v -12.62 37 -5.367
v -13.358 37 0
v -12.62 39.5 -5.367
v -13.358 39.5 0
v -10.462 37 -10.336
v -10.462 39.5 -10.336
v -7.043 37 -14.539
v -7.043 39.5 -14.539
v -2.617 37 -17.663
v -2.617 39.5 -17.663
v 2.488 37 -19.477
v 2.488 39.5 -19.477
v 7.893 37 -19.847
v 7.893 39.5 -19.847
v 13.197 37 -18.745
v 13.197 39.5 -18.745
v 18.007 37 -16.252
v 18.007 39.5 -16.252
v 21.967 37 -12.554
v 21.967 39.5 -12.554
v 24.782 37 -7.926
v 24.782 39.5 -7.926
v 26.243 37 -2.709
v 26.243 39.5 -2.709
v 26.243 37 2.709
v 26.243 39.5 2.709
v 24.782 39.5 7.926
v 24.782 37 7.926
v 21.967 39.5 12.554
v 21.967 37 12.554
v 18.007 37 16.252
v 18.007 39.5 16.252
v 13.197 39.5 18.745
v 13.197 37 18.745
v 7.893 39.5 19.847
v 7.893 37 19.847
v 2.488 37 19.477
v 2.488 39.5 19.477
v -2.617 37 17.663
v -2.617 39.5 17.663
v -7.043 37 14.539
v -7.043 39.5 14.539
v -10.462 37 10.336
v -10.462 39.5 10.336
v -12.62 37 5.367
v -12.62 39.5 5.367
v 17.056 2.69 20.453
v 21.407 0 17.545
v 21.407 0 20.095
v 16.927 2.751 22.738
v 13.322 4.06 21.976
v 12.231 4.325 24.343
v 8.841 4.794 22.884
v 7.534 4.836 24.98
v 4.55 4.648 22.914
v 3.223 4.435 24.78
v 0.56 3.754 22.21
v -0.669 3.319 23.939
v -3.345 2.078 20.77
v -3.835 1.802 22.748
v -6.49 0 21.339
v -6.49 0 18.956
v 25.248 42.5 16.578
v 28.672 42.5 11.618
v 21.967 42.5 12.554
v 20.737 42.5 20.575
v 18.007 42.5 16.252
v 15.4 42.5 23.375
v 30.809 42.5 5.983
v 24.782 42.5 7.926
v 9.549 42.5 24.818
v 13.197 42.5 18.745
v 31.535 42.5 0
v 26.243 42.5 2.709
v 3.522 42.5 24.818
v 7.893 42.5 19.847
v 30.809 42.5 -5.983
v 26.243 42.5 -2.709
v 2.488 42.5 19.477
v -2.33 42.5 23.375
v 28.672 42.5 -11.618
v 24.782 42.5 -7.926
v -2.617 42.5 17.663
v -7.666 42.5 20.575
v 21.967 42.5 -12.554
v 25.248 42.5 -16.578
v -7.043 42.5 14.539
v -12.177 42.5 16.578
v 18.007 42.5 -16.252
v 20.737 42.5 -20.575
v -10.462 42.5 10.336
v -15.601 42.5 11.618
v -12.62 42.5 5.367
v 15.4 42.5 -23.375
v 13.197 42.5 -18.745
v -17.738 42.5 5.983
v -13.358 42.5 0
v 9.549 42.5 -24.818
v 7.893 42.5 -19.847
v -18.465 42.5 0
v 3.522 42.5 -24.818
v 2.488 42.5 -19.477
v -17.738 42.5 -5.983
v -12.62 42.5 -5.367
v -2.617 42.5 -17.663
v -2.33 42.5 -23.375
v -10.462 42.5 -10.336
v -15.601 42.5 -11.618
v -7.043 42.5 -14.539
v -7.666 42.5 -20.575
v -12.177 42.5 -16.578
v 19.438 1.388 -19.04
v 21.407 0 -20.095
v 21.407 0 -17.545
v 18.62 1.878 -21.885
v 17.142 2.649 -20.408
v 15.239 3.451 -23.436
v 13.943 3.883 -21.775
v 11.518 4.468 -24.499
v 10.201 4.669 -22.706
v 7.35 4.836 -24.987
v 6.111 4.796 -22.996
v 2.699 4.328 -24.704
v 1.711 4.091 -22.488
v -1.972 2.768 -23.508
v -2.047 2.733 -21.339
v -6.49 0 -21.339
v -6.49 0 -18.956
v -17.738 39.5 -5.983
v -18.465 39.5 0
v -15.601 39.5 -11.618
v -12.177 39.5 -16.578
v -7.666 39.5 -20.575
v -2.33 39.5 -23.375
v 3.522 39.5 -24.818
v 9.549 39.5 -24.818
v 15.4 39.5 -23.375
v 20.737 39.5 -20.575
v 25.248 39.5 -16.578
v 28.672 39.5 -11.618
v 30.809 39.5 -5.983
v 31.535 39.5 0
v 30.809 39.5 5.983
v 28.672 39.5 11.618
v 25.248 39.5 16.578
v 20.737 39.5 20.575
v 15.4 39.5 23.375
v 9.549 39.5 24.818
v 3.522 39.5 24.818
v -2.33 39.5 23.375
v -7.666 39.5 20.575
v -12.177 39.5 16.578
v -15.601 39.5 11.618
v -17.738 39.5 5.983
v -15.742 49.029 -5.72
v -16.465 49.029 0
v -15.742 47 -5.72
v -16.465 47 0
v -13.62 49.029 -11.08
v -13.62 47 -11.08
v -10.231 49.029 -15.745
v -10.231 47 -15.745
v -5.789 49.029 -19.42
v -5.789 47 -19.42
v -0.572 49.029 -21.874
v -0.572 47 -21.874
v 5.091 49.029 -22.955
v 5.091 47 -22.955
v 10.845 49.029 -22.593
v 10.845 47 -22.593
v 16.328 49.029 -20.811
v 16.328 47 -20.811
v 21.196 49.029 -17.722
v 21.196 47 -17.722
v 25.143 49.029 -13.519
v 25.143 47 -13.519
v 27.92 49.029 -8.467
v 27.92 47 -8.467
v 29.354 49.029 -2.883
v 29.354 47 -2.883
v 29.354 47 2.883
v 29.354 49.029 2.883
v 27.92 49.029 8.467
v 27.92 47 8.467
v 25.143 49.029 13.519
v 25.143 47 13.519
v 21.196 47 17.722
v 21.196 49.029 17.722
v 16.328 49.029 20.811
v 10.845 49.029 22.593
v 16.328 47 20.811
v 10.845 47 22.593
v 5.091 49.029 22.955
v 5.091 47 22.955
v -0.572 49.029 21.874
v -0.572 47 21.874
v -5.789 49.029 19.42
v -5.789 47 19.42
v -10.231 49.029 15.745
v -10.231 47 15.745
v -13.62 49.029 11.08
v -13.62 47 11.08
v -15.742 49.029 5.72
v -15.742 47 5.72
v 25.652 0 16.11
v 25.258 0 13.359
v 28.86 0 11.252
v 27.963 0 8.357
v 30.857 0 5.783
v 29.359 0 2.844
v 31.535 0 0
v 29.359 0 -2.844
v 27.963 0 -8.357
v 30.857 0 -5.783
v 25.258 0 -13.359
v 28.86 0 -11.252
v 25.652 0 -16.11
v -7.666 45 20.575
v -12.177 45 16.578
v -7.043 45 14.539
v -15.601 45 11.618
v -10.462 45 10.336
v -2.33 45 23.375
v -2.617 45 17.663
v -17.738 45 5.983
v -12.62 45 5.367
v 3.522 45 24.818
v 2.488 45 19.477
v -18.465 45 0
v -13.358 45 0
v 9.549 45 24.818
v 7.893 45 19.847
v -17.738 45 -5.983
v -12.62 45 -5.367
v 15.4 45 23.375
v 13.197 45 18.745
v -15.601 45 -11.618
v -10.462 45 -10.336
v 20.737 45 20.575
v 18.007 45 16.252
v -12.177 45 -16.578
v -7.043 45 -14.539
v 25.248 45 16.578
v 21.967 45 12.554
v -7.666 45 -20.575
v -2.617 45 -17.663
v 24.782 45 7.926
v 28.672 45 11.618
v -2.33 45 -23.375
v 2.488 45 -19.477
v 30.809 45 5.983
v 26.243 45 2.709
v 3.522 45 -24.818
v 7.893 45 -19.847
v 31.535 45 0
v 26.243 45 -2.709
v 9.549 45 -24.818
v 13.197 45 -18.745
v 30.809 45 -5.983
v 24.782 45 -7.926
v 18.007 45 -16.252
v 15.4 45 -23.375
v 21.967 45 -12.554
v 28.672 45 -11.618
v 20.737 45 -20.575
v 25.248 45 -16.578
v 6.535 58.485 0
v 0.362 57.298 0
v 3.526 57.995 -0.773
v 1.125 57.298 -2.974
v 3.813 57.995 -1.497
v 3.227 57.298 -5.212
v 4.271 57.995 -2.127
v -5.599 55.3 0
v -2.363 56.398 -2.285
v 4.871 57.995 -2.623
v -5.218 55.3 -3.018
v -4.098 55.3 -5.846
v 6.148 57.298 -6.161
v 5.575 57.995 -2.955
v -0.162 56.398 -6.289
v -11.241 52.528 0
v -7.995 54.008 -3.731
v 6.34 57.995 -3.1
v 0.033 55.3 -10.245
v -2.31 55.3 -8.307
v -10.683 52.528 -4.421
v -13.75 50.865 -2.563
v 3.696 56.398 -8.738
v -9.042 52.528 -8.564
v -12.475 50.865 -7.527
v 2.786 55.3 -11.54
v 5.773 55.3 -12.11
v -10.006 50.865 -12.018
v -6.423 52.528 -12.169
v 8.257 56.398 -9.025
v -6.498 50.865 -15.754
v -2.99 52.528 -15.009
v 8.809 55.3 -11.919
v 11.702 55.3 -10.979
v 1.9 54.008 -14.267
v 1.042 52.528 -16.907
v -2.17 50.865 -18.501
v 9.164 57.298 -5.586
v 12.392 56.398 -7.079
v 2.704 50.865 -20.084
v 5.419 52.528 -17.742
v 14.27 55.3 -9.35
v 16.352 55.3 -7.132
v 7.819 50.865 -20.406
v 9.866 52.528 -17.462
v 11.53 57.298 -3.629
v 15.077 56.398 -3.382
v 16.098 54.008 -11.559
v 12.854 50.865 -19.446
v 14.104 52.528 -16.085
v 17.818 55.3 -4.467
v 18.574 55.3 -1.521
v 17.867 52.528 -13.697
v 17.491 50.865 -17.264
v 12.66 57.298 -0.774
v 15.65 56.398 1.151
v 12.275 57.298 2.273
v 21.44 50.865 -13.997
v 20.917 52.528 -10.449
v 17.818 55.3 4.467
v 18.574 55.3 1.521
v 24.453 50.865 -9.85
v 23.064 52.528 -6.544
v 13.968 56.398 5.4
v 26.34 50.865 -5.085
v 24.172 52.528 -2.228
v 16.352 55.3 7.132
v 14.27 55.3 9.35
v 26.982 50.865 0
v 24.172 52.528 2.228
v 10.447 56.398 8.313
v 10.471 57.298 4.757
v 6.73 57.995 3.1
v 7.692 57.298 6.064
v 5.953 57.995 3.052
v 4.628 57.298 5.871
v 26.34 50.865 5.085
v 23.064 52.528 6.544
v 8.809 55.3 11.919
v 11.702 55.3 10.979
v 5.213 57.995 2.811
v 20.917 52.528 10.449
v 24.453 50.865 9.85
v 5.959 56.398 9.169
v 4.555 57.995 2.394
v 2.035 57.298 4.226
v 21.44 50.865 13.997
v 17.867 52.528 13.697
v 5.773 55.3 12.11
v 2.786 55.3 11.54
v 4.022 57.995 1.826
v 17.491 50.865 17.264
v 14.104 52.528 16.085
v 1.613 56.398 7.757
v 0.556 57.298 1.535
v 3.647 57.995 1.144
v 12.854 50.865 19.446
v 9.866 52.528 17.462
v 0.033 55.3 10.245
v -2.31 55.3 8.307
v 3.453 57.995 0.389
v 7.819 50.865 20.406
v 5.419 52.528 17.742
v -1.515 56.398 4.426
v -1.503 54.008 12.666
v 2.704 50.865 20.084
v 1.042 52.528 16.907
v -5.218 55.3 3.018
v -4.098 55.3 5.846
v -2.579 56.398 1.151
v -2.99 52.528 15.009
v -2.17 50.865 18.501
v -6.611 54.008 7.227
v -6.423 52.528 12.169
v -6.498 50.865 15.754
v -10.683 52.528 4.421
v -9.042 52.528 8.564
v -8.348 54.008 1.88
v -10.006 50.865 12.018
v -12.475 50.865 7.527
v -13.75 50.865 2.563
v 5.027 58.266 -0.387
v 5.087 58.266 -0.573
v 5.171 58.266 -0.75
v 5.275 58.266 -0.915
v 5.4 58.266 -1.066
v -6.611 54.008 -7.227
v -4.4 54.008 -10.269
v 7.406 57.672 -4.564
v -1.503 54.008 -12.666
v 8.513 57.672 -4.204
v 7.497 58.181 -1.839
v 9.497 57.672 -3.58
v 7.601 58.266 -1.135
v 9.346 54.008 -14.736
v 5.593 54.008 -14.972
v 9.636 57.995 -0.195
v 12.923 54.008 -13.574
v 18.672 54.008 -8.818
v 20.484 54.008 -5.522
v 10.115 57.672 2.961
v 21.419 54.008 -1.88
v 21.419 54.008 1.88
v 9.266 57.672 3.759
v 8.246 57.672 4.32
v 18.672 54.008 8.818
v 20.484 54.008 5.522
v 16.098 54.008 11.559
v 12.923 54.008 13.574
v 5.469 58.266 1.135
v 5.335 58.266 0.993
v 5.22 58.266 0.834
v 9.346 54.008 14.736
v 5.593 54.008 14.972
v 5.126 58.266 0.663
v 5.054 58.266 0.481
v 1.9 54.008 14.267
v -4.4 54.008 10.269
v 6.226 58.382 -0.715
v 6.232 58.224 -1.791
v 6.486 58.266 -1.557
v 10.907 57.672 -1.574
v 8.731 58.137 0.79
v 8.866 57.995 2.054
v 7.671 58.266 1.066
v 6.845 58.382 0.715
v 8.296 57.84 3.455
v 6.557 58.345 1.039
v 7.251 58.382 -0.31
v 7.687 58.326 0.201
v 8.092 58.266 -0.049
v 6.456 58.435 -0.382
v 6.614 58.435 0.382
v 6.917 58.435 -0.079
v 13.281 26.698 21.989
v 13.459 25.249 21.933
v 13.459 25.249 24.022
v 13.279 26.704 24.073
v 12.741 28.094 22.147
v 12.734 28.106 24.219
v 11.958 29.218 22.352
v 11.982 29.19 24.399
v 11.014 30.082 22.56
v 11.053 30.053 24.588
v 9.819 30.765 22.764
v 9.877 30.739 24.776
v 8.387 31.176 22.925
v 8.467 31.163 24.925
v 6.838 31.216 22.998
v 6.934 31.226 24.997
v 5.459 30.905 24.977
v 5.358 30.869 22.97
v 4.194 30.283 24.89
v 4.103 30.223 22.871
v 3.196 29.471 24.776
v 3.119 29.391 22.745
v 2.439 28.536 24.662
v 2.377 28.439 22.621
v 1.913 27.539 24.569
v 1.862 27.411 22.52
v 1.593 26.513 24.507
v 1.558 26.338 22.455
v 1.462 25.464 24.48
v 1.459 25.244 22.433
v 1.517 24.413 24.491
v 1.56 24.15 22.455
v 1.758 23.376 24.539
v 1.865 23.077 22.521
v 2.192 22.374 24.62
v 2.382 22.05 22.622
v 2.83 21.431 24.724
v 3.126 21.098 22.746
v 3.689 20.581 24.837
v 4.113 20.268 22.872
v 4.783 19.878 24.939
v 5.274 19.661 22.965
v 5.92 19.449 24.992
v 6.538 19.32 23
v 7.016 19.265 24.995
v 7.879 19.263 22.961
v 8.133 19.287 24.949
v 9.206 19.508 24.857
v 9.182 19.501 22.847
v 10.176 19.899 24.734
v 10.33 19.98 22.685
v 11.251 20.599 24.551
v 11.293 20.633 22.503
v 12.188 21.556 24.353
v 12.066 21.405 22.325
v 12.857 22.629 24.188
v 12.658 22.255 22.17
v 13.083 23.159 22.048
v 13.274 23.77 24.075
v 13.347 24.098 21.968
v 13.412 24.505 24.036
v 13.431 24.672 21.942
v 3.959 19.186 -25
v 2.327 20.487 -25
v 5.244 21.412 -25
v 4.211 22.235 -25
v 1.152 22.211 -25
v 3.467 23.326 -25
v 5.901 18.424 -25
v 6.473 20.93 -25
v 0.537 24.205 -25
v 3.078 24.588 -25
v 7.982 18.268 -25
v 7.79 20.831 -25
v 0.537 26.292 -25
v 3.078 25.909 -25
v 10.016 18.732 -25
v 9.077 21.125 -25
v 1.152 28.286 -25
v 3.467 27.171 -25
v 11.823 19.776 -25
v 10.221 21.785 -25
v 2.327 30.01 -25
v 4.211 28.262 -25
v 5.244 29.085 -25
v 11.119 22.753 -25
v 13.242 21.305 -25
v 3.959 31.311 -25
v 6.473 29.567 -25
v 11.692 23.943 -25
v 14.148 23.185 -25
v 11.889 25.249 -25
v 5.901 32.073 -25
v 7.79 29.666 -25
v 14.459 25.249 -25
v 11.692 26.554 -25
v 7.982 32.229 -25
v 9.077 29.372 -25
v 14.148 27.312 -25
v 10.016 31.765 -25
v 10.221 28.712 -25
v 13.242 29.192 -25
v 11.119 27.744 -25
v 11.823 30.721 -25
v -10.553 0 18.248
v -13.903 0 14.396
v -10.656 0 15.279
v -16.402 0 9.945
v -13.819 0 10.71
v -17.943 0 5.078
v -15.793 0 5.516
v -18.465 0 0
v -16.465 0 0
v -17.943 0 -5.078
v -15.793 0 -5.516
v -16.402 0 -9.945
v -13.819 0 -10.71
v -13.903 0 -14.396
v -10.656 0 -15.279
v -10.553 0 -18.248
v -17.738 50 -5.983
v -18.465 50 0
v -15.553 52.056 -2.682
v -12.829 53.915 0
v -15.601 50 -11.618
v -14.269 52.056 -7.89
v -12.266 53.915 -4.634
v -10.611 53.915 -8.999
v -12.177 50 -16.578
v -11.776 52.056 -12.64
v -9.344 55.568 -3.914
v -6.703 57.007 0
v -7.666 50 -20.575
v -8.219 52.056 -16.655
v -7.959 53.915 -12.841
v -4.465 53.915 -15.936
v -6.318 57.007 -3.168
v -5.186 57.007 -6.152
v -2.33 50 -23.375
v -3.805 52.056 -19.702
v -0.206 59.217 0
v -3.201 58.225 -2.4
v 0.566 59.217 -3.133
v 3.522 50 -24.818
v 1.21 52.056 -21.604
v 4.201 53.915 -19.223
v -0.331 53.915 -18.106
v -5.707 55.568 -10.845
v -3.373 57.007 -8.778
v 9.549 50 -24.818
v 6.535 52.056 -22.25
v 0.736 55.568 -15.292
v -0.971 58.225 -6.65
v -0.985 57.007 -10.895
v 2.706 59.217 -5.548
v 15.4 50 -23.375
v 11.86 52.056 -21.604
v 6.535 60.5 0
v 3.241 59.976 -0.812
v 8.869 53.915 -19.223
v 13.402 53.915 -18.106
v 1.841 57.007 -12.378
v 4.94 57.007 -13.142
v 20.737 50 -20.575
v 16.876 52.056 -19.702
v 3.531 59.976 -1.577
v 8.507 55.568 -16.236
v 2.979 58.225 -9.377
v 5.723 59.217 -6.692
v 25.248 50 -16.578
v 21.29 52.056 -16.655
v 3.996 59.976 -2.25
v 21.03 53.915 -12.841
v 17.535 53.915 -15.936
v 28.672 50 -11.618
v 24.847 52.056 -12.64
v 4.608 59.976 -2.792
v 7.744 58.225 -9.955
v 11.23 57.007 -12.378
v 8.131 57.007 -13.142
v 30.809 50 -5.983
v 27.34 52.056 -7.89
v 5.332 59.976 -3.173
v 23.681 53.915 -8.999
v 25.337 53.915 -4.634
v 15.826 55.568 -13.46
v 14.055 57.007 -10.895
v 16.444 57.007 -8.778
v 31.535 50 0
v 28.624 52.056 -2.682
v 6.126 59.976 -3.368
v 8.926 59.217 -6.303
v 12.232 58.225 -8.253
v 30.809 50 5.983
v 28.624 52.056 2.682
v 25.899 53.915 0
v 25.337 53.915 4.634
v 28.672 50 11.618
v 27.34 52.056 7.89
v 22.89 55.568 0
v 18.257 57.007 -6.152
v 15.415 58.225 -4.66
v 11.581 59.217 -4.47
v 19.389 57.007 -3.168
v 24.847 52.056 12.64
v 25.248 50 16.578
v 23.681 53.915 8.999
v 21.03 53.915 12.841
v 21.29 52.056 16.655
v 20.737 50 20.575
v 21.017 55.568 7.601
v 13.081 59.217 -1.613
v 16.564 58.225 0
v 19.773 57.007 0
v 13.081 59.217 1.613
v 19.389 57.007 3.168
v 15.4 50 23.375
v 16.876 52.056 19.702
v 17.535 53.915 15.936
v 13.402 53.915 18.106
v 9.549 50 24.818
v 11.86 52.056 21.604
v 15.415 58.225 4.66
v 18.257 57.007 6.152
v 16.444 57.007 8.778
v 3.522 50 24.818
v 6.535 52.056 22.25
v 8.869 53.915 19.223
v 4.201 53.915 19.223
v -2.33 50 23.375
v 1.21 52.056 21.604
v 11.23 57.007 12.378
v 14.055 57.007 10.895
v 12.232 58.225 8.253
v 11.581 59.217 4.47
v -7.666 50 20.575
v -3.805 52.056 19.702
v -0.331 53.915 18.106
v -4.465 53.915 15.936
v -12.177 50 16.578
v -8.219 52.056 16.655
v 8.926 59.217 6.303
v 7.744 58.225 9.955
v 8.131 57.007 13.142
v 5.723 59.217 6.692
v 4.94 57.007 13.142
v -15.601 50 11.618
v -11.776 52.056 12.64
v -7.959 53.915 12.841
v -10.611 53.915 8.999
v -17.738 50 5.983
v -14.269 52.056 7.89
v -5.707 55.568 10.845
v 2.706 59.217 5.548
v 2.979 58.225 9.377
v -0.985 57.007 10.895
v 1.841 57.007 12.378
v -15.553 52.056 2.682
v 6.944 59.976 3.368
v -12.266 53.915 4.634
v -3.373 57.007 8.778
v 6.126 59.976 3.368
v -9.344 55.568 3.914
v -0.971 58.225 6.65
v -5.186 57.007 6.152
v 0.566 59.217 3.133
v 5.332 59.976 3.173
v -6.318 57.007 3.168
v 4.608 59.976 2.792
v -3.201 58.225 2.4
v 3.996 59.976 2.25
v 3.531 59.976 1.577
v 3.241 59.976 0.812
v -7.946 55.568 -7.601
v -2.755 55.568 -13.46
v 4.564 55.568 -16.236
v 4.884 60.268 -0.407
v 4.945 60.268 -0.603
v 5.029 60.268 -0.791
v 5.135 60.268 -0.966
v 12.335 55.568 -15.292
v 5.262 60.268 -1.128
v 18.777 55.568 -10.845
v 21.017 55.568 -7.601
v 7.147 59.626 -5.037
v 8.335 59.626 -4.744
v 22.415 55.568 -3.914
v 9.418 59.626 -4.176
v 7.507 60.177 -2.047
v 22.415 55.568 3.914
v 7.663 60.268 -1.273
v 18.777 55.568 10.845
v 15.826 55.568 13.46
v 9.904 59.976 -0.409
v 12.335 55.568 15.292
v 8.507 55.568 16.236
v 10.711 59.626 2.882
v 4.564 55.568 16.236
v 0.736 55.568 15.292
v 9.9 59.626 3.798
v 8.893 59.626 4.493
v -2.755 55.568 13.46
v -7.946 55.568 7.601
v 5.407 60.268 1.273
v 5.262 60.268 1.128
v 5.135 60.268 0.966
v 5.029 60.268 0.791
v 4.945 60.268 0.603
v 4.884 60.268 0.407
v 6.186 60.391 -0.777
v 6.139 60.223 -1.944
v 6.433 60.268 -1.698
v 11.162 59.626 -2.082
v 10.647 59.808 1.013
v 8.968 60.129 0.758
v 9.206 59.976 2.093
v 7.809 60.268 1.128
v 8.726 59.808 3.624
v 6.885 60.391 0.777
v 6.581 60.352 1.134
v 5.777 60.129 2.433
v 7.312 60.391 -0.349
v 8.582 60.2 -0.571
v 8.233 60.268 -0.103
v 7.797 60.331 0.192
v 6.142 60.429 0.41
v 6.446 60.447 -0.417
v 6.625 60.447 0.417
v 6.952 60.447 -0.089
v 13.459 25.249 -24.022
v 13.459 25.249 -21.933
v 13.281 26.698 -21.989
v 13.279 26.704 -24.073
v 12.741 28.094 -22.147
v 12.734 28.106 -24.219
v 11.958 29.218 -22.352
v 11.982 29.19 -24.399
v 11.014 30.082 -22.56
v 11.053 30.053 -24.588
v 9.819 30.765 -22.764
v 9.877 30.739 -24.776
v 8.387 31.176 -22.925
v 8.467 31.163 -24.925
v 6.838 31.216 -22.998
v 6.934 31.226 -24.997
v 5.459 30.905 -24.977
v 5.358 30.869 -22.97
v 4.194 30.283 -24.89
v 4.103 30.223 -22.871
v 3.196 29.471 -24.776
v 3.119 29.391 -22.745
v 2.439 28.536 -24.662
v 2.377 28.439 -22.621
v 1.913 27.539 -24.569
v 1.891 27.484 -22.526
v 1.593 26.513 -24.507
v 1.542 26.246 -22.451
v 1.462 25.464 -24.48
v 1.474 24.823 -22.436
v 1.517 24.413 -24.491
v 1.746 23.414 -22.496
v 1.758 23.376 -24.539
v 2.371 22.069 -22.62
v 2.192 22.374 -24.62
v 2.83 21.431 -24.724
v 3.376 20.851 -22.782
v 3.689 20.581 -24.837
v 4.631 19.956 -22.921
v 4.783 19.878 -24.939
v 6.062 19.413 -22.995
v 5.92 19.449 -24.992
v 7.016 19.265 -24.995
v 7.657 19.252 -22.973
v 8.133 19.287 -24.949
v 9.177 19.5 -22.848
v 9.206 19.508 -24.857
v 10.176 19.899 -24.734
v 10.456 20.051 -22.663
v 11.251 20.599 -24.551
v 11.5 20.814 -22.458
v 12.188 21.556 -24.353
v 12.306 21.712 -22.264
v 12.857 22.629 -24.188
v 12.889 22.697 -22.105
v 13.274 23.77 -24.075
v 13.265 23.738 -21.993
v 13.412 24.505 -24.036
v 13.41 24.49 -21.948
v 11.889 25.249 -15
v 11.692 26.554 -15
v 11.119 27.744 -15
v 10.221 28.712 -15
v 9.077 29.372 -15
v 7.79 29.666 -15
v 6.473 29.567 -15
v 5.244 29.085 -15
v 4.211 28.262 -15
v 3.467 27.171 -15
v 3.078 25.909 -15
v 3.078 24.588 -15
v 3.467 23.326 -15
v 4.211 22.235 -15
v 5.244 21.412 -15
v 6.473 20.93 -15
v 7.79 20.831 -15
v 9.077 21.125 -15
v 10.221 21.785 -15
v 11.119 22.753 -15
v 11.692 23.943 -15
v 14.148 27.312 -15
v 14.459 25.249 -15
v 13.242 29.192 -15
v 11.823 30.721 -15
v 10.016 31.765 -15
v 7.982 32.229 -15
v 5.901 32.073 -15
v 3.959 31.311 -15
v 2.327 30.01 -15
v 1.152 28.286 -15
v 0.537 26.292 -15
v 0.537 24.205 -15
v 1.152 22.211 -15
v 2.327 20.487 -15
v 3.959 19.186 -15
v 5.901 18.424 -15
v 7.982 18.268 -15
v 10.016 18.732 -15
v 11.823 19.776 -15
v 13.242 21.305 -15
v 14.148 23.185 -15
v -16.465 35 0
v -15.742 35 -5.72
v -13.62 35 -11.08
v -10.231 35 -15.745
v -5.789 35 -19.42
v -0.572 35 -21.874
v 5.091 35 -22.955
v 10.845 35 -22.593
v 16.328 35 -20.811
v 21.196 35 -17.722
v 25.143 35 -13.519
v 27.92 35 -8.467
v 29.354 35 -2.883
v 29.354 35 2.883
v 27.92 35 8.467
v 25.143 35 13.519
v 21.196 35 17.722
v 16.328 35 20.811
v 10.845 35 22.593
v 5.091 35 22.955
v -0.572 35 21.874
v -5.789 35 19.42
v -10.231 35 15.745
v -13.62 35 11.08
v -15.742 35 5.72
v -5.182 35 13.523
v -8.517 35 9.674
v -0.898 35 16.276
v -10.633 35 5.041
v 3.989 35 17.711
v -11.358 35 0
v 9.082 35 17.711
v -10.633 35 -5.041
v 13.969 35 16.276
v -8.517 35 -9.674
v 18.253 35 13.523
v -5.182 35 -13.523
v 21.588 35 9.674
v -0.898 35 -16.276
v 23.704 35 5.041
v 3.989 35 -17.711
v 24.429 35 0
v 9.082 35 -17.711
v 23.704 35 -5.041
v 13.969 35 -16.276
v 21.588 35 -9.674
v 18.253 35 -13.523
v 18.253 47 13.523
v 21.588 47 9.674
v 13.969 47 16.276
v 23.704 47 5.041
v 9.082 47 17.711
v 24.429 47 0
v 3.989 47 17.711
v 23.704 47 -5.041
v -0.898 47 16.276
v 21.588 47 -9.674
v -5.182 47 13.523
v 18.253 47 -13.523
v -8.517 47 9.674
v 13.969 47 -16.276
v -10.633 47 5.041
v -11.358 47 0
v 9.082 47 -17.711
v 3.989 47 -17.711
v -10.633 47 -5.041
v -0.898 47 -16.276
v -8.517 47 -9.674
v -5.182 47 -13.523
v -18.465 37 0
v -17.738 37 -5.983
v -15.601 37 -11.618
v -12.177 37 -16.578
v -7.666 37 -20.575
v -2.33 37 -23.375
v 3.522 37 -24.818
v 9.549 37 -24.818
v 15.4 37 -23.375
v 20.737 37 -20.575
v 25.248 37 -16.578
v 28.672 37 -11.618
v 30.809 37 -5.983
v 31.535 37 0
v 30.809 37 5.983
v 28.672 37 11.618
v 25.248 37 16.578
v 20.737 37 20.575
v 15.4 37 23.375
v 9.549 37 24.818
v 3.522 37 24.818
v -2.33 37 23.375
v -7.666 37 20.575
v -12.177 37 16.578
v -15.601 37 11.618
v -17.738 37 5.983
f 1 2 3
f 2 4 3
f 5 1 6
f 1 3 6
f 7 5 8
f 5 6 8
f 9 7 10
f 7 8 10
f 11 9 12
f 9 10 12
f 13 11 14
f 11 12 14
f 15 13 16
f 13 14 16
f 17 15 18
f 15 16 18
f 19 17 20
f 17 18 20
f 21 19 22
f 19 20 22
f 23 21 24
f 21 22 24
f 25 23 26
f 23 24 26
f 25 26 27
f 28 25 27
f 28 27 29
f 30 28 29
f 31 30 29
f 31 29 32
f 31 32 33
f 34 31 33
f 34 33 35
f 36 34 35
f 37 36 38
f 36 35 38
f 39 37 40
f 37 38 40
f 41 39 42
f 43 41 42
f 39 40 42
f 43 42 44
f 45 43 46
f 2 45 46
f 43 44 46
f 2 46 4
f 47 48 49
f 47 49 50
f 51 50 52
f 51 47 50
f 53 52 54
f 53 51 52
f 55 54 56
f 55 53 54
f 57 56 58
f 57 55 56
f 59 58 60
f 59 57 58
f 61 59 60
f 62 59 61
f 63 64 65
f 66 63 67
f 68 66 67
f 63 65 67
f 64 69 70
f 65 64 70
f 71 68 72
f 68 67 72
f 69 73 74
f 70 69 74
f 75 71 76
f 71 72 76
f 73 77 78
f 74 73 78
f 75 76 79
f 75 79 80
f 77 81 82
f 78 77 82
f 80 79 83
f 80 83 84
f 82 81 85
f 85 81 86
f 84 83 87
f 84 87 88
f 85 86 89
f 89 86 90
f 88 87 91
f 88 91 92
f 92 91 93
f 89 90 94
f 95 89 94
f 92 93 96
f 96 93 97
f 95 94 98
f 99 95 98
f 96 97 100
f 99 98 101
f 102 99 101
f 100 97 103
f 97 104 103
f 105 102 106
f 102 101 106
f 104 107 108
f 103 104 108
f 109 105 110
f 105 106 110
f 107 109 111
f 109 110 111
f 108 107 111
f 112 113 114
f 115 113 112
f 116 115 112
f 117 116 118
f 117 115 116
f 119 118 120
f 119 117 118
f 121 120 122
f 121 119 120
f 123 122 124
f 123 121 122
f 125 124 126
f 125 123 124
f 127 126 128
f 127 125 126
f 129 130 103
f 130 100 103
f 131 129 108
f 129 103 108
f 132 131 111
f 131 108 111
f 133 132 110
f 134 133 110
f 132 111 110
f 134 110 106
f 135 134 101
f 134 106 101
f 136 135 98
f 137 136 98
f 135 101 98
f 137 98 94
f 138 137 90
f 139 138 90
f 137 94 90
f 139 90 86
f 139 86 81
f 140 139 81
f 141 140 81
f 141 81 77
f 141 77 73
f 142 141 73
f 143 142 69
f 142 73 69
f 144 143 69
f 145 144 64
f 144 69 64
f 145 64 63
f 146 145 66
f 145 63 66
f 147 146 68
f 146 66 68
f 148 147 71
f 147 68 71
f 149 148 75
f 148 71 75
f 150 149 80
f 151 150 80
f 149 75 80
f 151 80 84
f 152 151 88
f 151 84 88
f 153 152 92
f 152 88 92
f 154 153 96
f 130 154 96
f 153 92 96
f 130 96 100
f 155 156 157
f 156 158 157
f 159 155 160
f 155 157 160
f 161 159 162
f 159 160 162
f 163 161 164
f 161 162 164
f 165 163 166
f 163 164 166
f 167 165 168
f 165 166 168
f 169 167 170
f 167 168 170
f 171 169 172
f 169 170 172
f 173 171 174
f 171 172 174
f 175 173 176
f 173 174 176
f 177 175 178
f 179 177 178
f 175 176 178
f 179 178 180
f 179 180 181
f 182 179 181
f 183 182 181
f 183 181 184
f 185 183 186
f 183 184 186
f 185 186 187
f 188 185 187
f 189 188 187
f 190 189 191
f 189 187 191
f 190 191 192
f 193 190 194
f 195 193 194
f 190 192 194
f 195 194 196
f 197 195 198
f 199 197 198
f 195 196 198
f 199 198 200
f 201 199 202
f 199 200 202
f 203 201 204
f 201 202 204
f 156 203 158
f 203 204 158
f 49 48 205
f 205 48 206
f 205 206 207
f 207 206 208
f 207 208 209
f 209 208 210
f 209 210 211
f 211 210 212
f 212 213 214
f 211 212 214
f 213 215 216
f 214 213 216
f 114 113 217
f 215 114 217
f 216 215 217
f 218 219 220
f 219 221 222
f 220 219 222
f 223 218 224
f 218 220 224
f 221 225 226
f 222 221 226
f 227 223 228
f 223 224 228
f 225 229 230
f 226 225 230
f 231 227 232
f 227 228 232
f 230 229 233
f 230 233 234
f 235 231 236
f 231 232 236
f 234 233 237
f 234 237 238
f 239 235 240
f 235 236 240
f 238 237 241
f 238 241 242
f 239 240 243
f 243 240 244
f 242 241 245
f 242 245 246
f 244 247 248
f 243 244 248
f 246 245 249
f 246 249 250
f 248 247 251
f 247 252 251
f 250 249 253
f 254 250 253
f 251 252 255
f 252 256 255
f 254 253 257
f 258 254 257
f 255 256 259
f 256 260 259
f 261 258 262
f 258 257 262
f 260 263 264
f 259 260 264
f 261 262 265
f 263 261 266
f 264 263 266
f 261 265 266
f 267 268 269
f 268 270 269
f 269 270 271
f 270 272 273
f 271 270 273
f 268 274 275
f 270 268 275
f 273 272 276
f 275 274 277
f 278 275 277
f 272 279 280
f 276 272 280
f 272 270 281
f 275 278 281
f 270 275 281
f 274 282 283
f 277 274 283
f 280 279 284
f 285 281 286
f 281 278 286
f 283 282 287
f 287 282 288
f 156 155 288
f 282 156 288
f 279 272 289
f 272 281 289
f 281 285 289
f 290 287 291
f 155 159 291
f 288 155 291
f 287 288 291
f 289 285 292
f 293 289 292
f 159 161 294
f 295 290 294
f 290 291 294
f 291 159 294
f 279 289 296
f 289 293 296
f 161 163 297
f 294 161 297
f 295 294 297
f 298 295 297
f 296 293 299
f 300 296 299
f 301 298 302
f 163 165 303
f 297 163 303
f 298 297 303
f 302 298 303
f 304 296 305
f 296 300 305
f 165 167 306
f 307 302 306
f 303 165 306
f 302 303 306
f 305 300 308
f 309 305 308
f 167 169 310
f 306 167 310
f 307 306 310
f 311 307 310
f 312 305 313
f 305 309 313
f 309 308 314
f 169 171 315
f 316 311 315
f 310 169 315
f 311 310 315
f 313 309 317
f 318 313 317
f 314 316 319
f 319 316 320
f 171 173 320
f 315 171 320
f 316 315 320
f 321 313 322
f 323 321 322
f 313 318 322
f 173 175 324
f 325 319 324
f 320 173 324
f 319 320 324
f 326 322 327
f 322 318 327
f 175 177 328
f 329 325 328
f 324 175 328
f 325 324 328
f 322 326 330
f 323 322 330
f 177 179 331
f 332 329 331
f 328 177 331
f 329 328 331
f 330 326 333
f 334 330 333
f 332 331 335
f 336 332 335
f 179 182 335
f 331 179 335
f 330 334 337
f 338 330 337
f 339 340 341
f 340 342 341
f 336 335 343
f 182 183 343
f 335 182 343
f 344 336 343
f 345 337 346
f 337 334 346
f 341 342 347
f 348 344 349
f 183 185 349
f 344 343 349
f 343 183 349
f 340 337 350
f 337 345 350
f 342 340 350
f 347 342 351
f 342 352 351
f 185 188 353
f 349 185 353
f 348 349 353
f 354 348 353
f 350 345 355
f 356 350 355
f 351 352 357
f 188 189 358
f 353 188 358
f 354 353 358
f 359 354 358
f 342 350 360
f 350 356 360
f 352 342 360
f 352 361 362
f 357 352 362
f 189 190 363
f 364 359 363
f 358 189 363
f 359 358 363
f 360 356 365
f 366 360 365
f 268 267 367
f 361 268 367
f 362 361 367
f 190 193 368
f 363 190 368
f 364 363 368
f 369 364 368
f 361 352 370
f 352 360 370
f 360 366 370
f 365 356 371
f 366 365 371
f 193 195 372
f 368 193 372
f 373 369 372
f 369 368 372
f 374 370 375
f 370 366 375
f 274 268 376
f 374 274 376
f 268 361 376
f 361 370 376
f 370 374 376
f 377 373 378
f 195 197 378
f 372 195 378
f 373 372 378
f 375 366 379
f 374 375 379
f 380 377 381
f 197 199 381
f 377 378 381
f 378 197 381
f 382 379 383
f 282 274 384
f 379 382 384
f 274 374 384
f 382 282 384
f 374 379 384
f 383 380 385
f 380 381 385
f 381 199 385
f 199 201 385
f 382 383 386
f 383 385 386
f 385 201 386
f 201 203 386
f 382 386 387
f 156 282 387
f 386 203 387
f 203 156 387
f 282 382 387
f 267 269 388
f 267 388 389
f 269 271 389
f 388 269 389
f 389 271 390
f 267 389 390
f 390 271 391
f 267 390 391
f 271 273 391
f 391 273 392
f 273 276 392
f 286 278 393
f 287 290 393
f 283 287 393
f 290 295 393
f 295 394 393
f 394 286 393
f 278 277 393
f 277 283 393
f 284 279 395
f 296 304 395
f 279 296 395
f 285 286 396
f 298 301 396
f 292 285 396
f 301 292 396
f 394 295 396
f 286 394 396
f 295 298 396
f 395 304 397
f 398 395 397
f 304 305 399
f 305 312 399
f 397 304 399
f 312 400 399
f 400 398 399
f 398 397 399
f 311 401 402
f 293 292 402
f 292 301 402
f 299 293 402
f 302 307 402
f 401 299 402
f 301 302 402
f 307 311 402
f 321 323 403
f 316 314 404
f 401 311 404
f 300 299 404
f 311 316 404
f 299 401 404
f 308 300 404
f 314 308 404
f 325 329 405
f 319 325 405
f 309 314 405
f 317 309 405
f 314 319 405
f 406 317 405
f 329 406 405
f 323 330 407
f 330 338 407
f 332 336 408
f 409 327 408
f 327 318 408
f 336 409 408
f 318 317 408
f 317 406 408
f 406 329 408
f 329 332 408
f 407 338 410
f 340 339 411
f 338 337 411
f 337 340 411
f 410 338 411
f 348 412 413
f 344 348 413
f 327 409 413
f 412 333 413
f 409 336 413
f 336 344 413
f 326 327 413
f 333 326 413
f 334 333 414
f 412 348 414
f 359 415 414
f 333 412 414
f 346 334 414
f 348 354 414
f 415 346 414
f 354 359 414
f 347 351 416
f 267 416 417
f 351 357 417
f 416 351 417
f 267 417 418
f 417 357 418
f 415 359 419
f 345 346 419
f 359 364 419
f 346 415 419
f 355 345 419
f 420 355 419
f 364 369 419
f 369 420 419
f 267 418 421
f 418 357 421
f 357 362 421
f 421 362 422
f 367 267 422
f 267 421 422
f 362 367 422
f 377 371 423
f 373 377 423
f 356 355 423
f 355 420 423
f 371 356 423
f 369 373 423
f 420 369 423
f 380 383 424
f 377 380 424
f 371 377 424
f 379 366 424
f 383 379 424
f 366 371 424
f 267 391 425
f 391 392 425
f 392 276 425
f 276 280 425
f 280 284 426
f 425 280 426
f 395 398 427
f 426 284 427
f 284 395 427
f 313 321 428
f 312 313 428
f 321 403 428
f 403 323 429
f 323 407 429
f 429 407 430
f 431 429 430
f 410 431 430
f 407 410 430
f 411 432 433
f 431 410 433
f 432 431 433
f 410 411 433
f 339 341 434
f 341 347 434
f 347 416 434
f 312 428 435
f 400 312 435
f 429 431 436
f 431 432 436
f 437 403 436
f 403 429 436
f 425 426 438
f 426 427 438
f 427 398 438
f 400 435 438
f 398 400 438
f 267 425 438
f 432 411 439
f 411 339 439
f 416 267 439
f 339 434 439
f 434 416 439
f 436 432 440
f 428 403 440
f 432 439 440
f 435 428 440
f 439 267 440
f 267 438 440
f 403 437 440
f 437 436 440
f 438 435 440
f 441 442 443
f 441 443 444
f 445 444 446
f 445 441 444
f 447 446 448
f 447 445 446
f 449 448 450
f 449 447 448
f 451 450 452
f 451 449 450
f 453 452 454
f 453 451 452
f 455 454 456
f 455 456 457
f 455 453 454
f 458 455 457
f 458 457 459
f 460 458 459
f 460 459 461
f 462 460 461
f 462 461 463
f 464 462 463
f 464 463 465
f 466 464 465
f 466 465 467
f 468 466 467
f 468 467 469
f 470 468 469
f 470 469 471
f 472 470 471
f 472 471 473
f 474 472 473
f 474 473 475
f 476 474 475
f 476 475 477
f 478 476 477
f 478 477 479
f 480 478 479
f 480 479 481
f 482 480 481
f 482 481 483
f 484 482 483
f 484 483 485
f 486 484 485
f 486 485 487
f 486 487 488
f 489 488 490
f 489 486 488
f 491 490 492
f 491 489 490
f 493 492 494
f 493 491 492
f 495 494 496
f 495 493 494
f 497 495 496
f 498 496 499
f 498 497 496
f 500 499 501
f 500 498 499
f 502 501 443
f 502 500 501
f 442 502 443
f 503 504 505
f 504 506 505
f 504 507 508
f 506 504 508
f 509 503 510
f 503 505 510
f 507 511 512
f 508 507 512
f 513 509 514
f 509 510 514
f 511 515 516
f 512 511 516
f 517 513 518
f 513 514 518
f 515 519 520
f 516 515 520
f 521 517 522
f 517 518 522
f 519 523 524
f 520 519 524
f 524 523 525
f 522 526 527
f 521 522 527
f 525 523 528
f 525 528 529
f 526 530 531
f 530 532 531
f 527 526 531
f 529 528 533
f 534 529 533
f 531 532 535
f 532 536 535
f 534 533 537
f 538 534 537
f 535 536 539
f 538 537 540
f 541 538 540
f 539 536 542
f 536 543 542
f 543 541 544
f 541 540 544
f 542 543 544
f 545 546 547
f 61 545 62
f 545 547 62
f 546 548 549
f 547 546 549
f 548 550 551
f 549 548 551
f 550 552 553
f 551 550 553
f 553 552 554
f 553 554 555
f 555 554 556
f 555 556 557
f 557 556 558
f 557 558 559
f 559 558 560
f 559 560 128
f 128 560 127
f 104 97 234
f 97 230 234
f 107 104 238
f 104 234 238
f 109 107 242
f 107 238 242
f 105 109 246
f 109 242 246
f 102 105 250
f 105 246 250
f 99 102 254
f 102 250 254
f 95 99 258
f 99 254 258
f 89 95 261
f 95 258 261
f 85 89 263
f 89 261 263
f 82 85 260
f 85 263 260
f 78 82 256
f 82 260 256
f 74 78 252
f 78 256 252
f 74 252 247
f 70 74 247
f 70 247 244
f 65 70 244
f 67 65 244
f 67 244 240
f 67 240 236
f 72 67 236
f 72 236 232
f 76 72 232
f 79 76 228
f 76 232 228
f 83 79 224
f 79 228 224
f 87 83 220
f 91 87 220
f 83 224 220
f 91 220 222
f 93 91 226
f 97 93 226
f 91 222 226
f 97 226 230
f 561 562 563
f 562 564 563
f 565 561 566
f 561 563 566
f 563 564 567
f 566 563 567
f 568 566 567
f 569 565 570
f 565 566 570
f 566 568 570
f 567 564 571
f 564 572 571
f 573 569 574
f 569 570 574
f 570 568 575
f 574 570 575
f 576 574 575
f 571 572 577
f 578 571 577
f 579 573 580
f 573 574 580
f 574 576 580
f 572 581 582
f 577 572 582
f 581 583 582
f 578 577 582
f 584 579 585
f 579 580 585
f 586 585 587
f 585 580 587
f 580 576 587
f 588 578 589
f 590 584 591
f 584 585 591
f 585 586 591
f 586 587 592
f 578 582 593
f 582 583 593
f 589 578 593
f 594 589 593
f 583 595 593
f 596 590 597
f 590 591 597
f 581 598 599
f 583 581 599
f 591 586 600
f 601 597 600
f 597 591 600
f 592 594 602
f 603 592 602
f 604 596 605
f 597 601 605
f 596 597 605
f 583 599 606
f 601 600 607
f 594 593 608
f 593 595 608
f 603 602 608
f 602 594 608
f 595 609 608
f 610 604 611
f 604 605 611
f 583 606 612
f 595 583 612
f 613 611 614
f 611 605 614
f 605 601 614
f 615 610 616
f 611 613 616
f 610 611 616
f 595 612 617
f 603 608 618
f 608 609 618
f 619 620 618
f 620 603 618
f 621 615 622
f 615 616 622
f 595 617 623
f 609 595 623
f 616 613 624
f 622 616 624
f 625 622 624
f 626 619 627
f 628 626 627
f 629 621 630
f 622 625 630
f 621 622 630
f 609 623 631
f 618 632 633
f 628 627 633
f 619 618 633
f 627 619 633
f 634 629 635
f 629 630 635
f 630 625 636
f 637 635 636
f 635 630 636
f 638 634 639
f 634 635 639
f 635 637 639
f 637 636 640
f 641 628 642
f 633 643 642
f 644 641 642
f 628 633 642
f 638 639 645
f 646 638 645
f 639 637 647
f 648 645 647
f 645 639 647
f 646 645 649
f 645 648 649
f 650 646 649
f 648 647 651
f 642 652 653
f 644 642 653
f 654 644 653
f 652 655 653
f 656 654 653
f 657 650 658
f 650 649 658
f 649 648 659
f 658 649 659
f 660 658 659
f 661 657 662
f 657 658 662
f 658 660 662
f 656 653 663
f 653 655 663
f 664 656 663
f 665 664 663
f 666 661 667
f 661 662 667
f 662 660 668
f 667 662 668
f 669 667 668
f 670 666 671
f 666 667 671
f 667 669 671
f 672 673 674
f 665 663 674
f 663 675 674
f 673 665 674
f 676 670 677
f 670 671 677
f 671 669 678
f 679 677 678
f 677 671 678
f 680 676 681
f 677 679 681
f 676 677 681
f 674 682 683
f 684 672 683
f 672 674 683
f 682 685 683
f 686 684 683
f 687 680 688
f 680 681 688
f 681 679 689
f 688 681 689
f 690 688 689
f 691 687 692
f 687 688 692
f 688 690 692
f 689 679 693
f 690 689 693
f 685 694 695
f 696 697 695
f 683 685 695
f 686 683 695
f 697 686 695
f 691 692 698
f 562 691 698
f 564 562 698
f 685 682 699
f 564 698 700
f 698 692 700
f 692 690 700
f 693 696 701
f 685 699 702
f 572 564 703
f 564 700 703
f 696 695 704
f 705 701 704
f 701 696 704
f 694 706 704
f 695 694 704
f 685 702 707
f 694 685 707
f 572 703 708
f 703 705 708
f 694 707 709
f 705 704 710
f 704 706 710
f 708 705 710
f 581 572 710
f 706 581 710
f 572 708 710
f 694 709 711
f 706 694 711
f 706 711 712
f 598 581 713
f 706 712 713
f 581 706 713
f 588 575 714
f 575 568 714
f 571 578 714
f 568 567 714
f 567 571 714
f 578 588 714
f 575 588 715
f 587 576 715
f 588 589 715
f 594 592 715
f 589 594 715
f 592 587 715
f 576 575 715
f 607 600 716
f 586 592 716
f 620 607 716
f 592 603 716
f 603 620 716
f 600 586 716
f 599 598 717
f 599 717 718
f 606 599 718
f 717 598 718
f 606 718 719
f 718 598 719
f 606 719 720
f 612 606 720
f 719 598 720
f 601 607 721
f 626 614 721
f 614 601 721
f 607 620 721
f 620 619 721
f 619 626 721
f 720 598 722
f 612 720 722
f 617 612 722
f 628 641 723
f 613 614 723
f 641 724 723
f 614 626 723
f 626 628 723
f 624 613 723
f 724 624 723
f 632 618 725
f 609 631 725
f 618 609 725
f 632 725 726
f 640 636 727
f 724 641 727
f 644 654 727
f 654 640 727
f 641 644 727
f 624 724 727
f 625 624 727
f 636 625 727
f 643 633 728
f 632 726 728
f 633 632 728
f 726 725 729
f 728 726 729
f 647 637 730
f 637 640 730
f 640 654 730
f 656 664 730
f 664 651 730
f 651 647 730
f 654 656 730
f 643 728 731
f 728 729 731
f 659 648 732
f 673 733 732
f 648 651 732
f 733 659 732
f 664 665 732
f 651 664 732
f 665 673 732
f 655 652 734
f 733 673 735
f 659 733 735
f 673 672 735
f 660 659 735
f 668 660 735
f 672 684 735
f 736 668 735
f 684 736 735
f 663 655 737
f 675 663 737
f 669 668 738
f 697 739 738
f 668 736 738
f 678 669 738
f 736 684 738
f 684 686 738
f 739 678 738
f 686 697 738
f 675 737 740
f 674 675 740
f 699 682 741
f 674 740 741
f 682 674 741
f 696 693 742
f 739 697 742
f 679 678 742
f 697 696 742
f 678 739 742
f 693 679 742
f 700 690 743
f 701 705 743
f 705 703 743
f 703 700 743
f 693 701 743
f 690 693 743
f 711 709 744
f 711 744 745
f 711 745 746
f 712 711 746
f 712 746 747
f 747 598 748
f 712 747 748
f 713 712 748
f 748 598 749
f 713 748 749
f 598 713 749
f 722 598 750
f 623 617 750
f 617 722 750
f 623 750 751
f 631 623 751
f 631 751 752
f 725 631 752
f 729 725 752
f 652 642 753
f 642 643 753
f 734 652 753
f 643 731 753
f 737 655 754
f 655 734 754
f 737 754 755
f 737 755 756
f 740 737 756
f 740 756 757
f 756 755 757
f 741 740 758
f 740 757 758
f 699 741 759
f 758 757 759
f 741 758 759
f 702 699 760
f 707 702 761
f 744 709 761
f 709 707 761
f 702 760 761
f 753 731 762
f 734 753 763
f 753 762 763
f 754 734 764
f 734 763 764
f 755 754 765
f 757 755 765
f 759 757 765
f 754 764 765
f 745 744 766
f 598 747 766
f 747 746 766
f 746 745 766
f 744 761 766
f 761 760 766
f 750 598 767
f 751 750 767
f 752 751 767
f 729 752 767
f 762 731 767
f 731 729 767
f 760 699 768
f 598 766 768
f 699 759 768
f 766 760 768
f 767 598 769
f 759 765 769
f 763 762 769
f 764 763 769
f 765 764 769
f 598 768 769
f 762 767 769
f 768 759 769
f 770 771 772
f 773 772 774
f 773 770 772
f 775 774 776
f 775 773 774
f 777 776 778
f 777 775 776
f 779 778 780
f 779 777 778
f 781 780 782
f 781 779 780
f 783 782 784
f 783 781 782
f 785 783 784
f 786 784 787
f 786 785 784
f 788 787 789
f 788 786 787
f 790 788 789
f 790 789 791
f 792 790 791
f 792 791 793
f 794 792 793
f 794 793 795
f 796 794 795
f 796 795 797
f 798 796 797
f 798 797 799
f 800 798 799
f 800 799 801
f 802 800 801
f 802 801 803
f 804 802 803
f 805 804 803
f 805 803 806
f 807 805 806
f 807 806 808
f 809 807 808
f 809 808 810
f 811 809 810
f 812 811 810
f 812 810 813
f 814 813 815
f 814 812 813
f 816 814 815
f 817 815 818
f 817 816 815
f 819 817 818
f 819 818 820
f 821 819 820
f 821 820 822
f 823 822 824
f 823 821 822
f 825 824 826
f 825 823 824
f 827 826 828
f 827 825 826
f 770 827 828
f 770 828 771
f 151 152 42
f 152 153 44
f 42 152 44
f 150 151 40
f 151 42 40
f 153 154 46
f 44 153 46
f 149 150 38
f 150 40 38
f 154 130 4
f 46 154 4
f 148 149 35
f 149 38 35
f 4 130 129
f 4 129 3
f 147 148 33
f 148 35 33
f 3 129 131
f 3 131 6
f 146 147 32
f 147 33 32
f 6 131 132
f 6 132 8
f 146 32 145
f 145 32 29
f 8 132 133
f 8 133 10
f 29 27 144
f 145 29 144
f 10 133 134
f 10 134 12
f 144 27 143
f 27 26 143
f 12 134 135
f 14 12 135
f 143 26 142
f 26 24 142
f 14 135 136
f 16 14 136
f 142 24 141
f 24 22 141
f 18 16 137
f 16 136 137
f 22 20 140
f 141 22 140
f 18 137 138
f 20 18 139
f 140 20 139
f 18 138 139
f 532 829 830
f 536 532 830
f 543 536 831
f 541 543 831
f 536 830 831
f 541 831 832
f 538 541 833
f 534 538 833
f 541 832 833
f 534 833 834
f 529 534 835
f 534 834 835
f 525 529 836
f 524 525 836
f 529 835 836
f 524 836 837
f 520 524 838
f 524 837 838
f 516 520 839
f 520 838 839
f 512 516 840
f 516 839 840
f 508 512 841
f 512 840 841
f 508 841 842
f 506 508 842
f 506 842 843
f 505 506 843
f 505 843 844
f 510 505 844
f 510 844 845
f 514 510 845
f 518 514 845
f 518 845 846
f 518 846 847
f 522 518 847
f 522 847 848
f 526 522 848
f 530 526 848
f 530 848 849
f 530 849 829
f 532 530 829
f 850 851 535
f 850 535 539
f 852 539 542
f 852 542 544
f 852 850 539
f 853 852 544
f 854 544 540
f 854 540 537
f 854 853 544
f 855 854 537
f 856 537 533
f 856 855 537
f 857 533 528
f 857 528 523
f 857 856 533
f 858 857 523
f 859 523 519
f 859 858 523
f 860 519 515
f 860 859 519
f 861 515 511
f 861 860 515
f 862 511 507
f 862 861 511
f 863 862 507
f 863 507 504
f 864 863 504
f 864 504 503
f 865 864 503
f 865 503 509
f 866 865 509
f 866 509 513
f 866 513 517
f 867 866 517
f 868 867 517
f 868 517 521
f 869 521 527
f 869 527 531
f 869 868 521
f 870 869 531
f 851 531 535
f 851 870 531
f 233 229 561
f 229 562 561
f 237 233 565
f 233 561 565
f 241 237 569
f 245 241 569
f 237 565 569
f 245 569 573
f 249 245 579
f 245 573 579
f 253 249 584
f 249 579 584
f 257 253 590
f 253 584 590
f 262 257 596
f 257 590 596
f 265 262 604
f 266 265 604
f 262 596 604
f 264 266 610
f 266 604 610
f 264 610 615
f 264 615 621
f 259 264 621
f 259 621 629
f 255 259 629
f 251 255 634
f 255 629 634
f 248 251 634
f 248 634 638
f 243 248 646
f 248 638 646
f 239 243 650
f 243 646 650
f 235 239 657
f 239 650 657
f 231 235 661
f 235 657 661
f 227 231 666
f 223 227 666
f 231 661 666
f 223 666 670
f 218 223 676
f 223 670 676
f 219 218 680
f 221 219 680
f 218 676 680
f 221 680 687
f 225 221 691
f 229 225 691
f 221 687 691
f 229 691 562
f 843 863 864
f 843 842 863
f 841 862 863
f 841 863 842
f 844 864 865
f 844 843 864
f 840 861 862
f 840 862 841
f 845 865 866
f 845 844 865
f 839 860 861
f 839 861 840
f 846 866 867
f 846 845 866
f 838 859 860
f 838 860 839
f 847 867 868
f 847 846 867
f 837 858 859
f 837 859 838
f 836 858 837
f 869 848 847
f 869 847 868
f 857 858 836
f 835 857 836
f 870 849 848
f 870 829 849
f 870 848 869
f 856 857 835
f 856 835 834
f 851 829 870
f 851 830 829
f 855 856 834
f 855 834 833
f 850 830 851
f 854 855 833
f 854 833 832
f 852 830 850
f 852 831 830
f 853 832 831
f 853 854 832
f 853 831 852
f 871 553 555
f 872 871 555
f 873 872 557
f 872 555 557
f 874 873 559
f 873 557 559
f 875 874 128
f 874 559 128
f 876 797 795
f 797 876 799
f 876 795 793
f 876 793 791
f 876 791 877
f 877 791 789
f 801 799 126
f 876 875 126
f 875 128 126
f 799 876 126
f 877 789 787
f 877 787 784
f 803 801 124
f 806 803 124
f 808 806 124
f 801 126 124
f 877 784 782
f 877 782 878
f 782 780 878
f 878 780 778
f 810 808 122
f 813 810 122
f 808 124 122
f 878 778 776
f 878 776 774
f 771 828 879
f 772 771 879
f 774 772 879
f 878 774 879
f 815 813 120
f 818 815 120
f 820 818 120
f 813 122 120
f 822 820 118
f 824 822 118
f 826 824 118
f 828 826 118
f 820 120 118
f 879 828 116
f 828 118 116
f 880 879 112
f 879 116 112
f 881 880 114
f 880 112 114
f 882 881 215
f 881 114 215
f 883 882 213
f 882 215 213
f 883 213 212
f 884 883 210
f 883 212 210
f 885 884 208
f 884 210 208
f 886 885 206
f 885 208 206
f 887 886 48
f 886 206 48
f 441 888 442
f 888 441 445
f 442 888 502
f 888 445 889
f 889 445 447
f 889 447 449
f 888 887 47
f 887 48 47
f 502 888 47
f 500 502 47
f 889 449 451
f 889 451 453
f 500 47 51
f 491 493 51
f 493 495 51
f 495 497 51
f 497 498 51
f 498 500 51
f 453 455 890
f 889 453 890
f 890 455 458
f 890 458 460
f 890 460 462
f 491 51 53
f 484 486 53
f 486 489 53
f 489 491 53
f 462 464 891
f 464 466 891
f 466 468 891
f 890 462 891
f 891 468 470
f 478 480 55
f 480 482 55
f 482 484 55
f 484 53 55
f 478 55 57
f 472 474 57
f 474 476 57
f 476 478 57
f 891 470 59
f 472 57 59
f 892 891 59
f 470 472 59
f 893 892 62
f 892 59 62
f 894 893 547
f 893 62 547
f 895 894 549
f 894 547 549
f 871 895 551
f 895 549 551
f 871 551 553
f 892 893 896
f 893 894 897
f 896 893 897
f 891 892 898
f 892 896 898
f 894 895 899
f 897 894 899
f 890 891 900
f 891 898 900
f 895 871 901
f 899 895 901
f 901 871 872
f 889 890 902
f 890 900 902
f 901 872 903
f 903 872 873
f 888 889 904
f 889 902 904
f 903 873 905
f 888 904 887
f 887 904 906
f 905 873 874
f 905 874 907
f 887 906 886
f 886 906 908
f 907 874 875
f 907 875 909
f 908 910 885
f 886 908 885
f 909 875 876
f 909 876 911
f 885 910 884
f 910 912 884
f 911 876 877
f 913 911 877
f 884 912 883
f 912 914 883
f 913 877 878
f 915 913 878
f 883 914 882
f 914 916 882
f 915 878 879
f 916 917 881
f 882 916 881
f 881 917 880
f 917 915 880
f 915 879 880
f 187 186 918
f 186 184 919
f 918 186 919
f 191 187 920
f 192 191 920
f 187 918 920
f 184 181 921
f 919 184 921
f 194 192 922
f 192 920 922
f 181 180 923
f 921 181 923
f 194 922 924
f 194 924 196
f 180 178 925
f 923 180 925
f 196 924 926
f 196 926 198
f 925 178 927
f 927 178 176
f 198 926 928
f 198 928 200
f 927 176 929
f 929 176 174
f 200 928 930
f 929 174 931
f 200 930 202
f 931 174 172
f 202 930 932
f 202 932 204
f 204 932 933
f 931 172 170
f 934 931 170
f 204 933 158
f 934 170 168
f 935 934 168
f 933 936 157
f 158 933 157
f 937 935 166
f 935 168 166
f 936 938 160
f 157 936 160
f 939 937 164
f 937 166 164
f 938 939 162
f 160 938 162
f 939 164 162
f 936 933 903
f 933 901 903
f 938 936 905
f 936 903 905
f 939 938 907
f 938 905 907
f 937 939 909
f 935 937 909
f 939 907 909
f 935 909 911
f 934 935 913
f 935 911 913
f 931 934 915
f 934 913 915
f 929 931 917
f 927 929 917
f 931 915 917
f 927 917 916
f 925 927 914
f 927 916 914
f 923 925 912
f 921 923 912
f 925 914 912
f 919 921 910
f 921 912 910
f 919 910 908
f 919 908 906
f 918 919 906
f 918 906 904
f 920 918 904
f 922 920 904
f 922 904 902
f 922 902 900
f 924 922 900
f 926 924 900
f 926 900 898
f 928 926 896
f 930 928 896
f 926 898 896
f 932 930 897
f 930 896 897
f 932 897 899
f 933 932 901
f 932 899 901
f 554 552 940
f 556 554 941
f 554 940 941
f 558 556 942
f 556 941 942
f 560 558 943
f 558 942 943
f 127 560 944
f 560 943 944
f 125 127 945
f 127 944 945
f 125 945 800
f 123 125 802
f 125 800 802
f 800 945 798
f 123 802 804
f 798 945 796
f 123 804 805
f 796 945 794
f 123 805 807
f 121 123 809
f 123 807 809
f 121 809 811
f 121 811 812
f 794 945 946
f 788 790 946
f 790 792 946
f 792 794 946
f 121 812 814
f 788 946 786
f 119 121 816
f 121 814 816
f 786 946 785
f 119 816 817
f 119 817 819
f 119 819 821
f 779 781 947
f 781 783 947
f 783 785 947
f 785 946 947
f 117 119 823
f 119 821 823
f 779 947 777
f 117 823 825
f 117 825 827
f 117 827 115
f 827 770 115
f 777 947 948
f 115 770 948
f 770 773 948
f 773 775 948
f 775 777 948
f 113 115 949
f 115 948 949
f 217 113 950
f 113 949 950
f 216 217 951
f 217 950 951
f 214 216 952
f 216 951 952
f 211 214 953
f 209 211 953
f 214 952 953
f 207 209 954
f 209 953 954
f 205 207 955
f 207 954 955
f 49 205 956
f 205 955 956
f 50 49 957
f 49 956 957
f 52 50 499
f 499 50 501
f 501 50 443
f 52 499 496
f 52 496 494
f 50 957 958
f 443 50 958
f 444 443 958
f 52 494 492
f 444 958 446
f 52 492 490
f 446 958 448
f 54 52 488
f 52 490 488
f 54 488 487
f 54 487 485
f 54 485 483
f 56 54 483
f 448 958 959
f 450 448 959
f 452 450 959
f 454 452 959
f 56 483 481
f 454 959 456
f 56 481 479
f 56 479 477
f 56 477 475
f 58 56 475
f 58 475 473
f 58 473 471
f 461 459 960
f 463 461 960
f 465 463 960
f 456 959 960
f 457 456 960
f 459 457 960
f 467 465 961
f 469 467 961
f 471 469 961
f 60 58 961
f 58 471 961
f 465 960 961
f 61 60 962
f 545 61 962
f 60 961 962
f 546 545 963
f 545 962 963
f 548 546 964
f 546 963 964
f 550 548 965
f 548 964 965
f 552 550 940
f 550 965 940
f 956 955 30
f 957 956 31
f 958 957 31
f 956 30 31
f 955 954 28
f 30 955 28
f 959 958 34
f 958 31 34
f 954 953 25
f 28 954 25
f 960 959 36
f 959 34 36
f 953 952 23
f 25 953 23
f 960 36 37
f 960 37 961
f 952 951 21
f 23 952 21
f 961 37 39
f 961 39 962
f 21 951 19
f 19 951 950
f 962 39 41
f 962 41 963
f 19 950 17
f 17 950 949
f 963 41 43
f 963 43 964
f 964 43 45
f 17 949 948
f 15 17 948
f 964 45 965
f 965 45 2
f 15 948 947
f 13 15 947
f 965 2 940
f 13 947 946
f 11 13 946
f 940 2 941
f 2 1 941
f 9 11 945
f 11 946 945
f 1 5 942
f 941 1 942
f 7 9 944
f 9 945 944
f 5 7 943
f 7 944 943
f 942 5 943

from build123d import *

# Parameters (mm, degrees)
CUT_EXTRUDE2_DEPTH      = 73.661751058
CUT_EXTRUDE2_DEPTH_BACK = 73.661751058
SKETCH2_R               = 6
BOSS_EXTRUDE12_START    = -15
SKETCH5_R               = 7
BOSS_EXTRUDE12_DEPTH    = 10
SKETCH8_R               = 4.429949132
CUT_EXTRUDE17_DEPTH     = 65


with BuildPart() as part:
    # Sketch1 → Revolve1 (revolve)
    with BuildSketch(Plane.XY, mode=Mode.PRIVATE) as revolve1_sk:
        with BuildLine():
            Line((31.535377647, 0), (31.535377647, 37))
            Line((31.535377647, 37), (26.428736502, 37))
            Line((26.428736502, 37), (26.428736502, 39.5))
            Line((26.428736502, 39.5), (31.535377647, 39.5))
            Line((31.535377647, 39.5), (31.535377647, 42.5))
            Line((31.535377647, 42.5), (26.428736502, 42.5))
            Line((26.428736502, 42.5), (26.428736502, 45))
            Line((26.428736502, 45), (31.535377647, 45))
            Line((31.535377647, 45), (31.535377647, 50))
            ThreePointArc((31.535377647, 50), (19.773454106, 57.007324902), (6.535377647, 60.5))
            Line((6.535377647, 60.5), (6.535377647, 58.485322825))
            ThreePointArc((6.535377647, 58.485322825), (18.669730587, 55.300187699), (29.535377647, 49.029197266))
            Line((29.535377647, 49.029197266), (29.535377647, 47))
            Line((29.535377647, 47), (24.428736502, 47))
            Line((24.428736502, 47), (24.428736502, 41))
            Line((24.428736502, 41), (24.428736502, 35))
            Line((24.428736502, 35), (29.535377647, 35))
            Line((29.535377647, 35), (29.535377647, 0))
            Line((29.535377647, 0), (31.535377647, 0))
        make_face()
    revolve(revolve1_sk.sketch.rotate(Axis((6.535377647, 60.5, 0), (0, -1, 0)), 180), axis=Axis((6.535377647, 60.5, 0), (0, -1, 0)))

    # Sketch2 → Cut-Extrude2 (cut, two sides: drawn at the far end of the back side and taken through both)
    with BuildSketch(Plane.XY.offset(-CUT_EXTRUDE2_DEPTH_BACK)):
        with Locations((7.458608079, 25.248507494)):
            Circle(SKETCH2_R)
        with BuildLine():
            Line((-6.490236288, 0), (21.407452446, 0))
            ThreePointArc((21.407452446, 0), (7.458608079, 4.836309849), (-6.490236288, 0))
        make_face()
    extrude(amount=CUT_EXTRUDE2_DEPTH + CUT_EXTRUDE2_DEPTH_BACK, mode=Mode.SUBTRACT)


with BuildPart() as body_2:
    # Sketch5 → Boss-Extrude12 (new, through all)
    with BuildSketch(Plane.XY.offset(BOSS_EXTRUDE12_START)):
        with Locations((7.458608079, 25.248507494)):
            Circle(SKETCH5_R)
    extrude(amount=-BOSS_EXTRUDE12_DEPTH)

    # Sketch8 → Cut-Extrude17 (cut)
    with BuildSketch(Plane.XY):
        with Locations((7.458608079, 25.248507494)):
            Circle(SKETCH8_R)
    extrude(amount=-CUT_EXTRUDE17_DEPTH, mode=Mode.SUBTRACT)


solid = Compound([part.part, body_2.part])
